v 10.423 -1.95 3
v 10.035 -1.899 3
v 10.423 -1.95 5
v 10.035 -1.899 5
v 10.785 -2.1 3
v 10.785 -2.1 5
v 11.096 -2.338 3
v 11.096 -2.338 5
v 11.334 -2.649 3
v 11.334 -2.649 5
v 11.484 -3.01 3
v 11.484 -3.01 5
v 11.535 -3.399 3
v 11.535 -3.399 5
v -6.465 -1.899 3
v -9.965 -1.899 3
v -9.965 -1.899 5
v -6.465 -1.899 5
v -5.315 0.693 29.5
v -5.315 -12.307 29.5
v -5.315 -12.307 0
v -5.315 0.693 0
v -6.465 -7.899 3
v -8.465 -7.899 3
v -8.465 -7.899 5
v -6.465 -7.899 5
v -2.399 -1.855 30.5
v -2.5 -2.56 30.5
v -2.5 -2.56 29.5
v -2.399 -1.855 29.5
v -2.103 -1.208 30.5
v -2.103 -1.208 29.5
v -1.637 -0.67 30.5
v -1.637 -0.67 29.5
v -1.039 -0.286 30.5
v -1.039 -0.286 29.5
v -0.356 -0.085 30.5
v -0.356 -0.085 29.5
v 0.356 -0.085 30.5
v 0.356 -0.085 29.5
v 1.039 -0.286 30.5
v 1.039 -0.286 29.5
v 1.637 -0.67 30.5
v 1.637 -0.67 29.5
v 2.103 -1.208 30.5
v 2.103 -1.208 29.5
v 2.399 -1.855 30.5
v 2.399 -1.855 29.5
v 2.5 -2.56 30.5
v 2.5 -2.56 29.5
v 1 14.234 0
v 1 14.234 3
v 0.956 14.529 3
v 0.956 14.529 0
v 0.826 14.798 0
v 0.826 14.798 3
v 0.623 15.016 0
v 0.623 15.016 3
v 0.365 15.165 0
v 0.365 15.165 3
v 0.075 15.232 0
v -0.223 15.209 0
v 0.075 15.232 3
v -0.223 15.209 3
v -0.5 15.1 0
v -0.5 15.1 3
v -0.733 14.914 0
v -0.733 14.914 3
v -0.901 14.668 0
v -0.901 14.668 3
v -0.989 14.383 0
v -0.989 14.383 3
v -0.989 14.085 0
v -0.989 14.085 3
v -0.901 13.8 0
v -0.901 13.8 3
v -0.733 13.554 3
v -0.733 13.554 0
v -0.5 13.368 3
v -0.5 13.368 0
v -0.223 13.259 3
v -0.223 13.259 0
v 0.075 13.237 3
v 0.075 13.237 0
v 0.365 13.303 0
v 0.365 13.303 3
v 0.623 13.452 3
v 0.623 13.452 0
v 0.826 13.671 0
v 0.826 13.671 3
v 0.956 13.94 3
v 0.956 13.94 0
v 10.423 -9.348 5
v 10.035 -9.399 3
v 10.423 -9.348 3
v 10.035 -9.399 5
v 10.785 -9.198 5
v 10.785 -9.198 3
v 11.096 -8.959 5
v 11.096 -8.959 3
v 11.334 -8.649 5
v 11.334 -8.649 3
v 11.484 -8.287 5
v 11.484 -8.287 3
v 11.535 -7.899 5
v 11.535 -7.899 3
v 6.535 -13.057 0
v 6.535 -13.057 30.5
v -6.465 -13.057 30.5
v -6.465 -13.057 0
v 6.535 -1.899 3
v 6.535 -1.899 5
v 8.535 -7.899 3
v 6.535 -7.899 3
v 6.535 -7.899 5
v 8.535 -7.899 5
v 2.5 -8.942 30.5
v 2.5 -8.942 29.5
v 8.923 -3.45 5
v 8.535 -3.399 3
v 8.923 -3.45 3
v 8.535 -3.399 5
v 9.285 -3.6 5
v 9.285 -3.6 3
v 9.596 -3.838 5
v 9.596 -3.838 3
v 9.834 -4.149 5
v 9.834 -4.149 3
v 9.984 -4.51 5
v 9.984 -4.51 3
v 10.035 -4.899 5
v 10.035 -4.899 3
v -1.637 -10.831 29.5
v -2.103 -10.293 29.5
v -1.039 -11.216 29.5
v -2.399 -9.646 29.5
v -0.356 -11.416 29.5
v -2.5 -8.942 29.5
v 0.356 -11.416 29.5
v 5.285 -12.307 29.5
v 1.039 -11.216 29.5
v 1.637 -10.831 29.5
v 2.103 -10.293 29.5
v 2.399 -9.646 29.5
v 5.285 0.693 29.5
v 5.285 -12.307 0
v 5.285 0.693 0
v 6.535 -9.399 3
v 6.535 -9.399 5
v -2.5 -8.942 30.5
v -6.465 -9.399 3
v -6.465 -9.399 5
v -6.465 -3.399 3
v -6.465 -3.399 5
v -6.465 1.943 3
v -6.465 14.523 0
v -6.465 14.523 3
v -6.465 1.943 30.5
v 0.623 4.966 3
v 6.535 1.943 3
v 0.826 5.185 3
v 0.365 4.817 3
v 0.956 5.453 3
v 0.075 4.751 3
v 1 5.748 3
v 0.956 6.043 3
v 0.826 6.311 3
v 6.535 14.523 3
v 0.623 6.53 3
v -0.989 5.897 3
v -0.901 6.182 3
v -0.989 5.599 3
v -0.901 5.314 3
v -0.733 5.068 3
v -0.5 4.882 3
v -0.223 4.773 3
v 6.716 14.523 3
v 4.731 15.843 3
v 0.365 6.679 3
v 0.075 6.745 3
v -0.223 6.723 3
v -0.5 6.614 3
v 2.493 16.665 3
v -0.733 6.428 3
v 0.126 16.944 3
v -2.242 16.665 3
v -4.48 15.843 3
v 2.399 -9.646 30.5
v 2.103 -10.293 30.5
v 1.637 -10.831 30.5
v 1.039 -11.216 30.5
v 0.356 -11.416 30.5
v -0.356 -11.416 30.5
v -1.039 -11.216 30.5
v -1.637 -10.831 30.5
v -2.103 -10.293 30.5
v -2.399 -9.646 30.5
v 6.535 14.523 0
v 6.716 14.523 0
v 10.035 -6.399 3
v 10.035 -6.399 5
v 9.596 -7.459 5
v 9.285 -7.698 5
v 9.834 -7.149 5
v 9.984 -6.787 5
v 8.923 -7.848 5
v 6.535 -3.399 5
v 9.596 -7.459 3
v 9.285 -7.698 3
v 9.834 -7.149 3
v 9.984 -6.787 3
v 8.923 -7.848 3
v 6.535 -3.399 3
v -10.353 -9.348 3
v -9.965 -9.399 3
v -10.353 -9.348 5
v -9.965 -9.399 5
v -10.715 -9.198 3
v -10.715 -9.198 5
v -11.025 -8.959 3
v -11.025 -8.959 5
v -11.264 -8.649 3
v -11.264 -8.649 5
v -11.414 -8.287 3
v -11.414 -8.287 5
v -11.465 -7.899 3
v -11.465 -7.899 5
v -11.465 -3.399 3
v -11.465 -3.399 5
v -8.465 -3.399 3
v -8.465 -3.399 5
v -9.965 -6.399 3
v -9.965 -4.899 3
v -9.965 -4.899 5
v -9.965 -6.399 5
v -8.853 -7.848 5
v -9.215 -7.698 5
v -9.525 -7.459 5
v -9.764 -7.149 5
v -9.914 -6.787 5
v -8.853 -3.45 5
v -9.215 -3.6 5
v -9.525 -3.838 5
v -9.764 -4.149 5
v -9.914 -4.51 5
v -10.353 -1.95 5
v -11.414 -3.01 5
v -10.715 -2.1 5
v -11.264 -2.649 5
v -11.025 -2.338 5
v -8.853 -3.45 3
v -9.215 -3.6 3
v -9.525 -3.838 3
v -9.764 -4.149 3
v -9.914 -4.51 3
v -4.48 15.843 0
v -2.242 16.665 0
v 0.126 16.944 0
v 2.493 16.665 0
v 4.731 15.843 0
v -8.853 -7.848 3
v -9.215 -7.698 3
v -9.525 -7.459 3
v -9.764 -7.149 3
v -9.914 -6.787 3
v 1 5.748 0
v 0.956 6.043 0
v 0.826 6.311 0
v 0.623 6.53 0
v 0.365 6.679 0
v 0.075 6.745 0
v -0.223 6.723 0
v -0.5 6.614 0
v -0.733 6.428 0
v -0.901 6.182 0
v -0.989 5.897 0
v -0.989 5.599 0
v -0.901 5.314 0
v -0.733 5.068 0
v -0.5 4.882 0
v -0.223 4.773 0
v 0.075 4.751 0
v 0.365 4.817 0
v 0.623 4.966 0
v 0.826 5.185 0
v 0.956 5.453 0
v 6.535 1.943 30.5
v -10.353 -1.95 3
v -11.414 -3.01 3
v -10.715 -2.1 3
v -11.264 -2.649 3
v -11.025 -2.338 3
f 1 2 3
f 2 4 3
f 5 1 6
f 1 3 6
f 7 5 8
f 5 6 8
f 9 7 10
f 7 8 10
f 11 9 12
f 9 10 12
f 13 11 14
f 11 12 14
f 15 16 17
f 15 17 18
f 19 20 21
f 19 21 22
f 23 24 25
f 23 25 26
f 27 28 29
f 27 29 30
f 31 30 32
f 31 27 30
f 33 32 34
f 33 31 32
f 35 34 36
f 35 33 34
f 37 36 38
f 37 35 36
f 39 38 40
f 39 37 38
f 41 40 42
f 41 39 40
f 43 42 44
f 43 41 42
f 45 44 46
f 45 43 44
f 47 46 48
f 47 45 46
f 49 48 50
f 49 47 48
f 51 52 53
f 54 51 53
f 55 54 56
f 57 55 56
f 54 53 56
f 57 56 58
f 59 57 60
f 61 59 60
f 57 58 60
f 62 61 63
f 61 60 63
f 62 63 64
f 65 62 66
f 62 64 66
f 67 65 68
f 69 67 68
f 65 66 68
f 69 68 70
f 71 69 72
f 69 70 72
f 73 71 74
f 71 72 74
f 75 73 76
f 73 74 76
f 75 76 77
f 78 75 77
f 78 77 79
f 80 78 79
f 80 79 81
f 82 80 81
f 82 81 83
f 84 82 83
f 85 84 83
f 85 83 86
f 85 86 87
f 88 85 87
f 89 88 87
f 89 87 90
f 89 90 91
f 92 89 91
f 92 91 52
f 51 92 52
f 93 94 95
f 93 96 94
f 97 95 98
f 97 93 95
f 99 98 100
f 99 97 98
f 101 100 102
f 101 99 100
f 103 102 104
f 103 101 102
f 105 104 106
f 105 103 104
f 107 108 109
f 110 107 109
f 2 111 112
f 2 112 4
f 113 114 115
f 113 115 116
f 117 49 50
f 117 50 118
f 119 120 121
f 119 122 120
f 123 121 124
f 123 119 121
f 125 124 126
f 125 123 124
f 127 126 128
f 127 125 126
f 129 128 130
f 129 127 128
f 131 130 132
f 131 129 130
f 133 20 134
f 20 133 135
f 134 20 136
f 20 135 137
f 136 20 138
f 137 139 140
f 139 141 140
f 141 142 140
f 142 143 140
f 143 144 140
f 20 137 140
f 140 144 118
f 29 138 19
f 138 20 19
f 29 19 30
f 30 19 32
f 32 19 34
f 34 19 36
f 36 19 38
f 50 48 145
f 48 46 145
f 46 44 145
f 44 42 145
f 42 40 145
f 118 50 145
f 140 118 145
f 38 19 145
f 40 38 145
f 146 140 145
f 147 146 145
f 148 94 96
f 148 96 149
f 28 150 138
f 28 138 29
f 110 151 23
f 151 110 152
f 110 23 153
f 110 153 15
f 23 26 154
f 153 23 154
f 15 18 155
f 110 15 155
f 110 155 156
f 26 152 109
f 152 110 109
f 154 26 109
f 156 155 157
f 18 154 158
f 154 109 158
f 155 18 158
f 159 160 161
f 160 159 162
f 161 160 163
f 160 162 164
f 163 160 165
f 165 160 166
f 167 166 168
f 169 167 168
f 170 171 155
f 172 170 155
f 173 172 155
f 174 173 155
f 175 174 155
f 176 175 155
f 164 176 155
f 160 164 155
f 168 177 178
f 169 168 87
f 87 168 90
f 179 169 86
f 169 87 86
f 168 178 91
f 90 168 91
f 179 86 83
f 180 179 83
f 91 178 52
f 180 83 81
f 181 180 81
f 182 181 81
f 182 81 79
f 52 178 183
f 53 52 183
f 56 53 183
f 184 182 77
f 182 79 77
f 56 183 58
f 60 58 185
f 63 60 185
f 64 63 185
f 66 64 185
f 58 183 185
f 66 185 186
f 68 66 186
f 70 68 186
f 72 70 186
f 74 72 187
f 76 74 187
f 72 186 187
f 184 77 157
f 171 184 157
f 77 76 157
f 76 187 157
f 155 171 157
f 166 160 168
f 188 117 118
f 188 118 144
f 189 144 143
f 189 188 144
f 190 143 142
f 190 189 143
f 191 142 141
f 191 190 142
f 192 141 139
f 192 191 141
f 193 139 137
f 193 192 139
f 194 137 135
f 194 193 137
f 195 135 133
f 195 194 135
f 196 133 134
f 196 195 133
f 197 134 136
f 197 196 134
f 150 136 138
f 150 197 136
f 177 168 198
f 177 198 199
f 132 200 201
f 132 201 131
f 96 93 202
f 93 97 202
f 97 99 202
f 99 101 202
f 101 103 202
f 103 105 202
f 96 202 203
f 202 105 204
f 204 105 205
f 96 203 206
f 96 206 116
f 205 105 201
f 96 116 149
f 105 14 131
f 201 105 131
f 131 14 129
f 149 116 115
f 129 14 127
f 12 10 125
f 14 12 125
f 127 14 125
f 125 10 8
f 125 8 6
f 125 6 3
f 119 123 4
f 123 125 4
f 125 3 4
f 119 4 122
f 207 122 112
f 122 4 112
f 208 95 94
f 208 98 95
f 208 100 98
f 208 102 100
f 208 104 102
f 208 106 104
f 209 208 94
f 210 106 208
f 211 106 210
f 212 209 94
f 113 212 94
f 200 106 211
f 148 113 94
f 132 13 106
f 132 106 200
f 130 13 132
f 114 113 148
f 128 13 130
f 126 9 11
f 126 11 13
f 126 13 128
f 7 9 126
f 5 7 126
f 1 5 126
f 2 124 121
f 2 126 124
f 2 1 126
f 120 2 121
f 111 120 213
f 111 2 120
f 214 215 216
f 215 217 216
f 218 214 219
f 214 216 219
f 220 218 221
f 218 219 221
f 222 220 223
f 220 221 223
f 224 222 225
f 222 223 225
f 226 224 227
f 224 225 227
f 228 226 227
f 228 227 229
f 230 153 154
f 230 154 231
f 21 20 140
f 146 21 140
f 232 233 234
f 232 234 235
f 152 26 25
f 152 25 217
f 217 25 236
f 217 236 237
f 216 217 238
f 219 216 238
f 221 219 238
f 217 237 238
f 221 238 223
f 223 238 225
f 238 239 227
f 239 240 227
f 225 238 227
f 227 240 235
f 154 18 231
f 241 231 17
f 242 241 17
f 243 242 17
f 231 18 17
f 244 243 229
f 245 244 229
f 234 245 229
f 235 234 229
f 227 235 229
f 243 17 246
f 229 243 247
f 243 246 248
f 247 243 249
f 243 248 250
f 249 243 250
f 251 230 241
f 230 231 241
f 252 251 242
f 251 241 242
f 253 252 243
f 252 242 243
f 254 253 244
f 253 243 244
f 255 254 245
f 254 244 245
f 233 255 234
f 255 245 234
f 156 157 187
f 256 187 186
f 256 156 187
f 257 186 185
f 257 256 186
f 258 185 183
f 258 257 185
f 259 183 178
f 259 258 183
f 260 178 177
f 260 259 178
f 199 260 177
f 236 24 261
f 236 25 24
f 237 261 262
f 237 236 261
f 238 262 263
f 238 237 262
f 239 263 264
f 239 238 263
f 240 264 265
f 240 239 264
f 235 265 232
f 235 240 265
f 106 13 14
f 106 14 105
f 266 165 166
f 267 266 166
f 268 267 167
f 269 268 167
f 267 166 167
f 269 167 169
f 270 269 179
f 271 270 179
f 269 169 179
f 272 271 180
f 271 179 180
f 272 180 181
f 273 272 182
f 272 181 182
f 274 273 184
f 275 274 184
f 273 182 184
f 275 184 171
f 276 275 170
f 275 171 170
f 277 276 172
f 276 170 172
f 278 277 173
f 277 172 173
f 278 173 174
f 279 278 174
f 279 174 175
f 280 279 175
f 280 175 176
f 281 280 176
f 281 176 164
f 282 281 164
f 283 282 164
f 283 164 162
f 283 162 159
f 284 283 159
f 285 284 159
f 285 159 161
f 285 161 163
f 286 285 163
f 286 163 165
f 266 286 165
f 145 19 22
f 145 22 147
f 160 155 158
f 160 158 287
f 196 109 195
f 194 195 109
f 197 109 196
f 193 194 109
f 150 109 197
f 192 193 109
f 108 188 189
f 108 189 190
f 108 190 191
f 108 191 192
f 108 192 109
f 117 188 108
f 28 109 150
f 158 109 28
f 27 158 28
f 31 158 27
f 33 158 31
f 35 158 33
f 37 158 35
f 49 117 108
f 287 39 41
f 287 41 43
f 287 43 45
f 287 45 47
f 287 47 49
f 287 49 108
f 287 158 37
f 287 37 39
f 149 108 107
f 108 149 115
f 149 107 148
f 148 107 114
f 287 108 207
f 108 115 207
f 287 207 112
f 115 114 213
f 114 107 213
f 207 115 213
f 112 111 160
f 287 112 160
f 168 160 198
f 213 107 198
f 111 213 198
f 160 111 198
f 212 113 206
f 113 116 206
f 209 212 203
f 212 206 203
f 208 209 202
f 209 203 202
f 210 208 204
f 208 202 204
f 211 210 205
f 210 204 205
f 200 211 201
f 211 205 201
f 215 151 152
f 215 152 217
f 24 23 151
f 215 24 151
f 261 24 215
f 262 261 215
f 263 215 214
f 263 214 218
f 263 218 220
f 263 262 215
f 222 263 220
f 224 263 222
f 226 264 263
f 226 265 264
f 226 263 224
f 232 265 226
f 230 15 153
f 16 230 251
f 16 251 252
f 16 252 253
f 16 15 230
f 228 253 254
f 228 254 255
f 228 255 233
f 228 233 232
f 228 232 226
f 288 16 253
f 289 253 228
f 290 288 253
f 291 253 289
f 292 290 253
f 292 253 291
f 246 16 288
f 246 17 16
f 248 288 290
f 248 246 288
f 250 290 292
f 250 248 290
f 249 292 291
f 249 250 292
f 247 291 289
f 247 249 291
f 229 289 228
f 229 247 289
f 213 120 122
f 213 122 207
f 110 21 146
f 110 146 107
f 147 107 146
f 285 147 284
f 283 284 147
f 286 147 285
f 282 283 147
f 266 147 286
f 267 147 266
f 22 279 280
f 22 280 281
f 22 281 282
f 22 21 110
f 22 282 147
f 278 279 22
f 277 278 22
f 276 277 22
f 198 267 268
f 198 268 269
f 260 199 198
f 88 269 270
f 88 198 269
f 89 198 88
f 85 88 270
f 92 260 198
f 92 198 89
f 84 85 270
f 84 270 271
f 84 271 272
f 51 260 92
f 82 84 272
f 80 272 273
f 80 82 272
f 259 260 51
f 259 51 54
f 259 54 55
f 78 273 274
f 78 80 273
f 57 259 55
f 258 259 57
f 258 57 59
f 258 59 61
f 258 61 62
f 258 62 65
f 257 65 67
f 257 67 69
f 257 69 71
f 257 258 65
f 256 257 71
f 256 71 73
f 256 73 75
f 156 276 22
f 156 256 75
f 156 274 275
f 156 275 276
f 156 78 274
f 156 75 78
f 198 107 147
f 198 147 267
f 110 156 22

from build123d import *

# Parameters (mm, degrees)
BOSS_EXTRUDE1_DEPTH = 3
SKETCH2_W           = 13
SKETCH2_H           = 15
BOSS_EXTRUDE2_DEPTH = 27.5
SKETCH3_W           = 10.6
SKETCH3_H           = 13
CUT_EXTRUDE1_DEPTH  = 26.5
CUT_EXTRUDE2_DEPTH  = 31.5
SKETCH5_W           = 1.5
SKETCH5_H           = 27.57988307
CUT_EXTRUDE3_DEPTH  = 4
BOSS_EXTRUDE4_DEPTH = 2
FILLET2_R           = 1.5
FILLET3_R           = 1.5
SKETCH7_R           = 1
CUT_EXTRUDE4_DEPTH  = 4


with BuildPart() as part:
    # Sketch1 → Boss-Extrude1 (new body)
    with BuildSketch(Plane.XY):
        with BuildLine():
            Line((8.035256759, -13.057292233), (-7.964743241, -13.057292233))
            Line((-7.964743241, -13.057292233), (-7.964743241, 12.942707767))
            ThreePointArc((-7.964743241, 12.942707767), (-0.020633322, 16.942707767), (8.035256759, 13.172891138))
            Line((8.035256759, 13.172891138), (8.035256759, -13.057292233))
        make_face()
    extrude(amount=BOSS_EXTRUDE1_DEPTH)

    # Sketch2 → Boss-Extrude2 (add)
    with BuildSketch(Plane.XY.offset(3)):
        with Locations((0.035256759, -5.557292233)):
            Rectangle(SKETCH2_W, SKETCH2_H)
    extrude(amount=BOSS_EXTRUDE2_DEPTH)

    # Sketch3 → Cut-Extrude1 (cut, symmetric)
    with BuildSketch(Plane.XY.offset(3)):
        with Locations((-0.014743241, -5.807292233)):
            Rectangle(SKETCH3_W, SKETCH3_H)
    extrude(amount=CUT_EXTRUDE1_DEPTH, both=True, mode=Mode.SUBTRACT)

    # Sketch4 → Cut-Extrude2 (cut, through all)
    with BuildSketch(Plane.XY.offset(30.5)):
        with BuildLine():
            Line((-2.5, -8.94154935), (-2.5, -2.55973464))
            ThreePointArc((-2.5, -2.55973464), (0, -0.05973464), (2.5, -2.55973464))
            Line((2.5, -2.55973464), (2.5, -8.94154935))
            ThreePointArc((2.5, -8.94154935), (0, -11.44154935), (-2.5, -8.94154935))
        make_face()
    extrude(amount=-CUT_EXTRUDE2_DEPTH, mode=Mode.SUBTRACT)

    # Sketch5 → Cut-Extrude3 (cut, through all)
    with BuildSketch(Plane.XY.offset(3)):
        with Locations((-7.214743241, 0.732649302)):
            Rectangle(SKETCH5_W, SKETCH5_H)
        with Locations((7.285256759, 0.732649302)):
            Rectangle(SKETCH5_W, SKETCH5_H)
    extrude(amount=-CUT_EXTRUDE3_DEPTH, mode=Mode.SUBTRACT)

    # Sketch6 → Boss-Extrude4 (add)
    with BuildSketch(Plane.XY.offset(3)):
        Polygon((-6.464743241, -3.398686813), (-9.964743241, -3.398686813), (-9.964743241, -7.898686813), (-6.464743241, -7.898686813), (-6.464743241, -9.398686813), (-11.464743241, -9.398686813), (-11.464743241, -1.898686813), (-6.464743241, -1.898686813), align=None)
        Polygon((6.535256759, -3.398686813), (6.535256759, -1.898686813), (11.535256759, -1.898686813), (11.535256759, -9.398686813), (6.535256759, -9.398686813), (6.535256759, -7.898686813), (10.035256759, -7.898686813), (10.035256759, -3.398686813), align=None)
    extrude(amount=BOSS_EXTRUDE4_DEPTH)

    # Fillet2
    fillet2_edges = [part.edges().sort_by_distance(p)[0] for p in [
        (-9.964743241, -3.398686813, 4),
        (-11.464743241, -1.898686813, 4),
        (-11.464743241, -9.398686813, 4),
        (-9.964743241, -7.898686813, 4),
    ]]
    fillet(fillet2_edges, radius=FILLET2_R)

    # Fillet3
    fillet3_edges = [part.edges().sort_by_distance(p)[0] for p in [
        (10.035256759, -3.398686813, 4),
        (10.035256759, -7.898686813, 4),
        (11.535256759, -9.398686813, 4),
        (11.535256759, -1.898686813, 4),
    ]]
    fillet(fillet3_edges, radius=FILLET3_R)

    # Sketch7 → Cut-Extrude4 (cut, through all)
    with BuildSketch(Plane.XY.offset(3)):
        with Locations((0, 14.234326683)):
            Circle(SKETCH7_R)
        with Locations((0, 5.748094445)):
            Circle(SKETCH7_R)
    extrude(amount=-CUT_EXTRUDE4_DEPTH, mode=Mode.SUBTRACT)


solid = part.part
